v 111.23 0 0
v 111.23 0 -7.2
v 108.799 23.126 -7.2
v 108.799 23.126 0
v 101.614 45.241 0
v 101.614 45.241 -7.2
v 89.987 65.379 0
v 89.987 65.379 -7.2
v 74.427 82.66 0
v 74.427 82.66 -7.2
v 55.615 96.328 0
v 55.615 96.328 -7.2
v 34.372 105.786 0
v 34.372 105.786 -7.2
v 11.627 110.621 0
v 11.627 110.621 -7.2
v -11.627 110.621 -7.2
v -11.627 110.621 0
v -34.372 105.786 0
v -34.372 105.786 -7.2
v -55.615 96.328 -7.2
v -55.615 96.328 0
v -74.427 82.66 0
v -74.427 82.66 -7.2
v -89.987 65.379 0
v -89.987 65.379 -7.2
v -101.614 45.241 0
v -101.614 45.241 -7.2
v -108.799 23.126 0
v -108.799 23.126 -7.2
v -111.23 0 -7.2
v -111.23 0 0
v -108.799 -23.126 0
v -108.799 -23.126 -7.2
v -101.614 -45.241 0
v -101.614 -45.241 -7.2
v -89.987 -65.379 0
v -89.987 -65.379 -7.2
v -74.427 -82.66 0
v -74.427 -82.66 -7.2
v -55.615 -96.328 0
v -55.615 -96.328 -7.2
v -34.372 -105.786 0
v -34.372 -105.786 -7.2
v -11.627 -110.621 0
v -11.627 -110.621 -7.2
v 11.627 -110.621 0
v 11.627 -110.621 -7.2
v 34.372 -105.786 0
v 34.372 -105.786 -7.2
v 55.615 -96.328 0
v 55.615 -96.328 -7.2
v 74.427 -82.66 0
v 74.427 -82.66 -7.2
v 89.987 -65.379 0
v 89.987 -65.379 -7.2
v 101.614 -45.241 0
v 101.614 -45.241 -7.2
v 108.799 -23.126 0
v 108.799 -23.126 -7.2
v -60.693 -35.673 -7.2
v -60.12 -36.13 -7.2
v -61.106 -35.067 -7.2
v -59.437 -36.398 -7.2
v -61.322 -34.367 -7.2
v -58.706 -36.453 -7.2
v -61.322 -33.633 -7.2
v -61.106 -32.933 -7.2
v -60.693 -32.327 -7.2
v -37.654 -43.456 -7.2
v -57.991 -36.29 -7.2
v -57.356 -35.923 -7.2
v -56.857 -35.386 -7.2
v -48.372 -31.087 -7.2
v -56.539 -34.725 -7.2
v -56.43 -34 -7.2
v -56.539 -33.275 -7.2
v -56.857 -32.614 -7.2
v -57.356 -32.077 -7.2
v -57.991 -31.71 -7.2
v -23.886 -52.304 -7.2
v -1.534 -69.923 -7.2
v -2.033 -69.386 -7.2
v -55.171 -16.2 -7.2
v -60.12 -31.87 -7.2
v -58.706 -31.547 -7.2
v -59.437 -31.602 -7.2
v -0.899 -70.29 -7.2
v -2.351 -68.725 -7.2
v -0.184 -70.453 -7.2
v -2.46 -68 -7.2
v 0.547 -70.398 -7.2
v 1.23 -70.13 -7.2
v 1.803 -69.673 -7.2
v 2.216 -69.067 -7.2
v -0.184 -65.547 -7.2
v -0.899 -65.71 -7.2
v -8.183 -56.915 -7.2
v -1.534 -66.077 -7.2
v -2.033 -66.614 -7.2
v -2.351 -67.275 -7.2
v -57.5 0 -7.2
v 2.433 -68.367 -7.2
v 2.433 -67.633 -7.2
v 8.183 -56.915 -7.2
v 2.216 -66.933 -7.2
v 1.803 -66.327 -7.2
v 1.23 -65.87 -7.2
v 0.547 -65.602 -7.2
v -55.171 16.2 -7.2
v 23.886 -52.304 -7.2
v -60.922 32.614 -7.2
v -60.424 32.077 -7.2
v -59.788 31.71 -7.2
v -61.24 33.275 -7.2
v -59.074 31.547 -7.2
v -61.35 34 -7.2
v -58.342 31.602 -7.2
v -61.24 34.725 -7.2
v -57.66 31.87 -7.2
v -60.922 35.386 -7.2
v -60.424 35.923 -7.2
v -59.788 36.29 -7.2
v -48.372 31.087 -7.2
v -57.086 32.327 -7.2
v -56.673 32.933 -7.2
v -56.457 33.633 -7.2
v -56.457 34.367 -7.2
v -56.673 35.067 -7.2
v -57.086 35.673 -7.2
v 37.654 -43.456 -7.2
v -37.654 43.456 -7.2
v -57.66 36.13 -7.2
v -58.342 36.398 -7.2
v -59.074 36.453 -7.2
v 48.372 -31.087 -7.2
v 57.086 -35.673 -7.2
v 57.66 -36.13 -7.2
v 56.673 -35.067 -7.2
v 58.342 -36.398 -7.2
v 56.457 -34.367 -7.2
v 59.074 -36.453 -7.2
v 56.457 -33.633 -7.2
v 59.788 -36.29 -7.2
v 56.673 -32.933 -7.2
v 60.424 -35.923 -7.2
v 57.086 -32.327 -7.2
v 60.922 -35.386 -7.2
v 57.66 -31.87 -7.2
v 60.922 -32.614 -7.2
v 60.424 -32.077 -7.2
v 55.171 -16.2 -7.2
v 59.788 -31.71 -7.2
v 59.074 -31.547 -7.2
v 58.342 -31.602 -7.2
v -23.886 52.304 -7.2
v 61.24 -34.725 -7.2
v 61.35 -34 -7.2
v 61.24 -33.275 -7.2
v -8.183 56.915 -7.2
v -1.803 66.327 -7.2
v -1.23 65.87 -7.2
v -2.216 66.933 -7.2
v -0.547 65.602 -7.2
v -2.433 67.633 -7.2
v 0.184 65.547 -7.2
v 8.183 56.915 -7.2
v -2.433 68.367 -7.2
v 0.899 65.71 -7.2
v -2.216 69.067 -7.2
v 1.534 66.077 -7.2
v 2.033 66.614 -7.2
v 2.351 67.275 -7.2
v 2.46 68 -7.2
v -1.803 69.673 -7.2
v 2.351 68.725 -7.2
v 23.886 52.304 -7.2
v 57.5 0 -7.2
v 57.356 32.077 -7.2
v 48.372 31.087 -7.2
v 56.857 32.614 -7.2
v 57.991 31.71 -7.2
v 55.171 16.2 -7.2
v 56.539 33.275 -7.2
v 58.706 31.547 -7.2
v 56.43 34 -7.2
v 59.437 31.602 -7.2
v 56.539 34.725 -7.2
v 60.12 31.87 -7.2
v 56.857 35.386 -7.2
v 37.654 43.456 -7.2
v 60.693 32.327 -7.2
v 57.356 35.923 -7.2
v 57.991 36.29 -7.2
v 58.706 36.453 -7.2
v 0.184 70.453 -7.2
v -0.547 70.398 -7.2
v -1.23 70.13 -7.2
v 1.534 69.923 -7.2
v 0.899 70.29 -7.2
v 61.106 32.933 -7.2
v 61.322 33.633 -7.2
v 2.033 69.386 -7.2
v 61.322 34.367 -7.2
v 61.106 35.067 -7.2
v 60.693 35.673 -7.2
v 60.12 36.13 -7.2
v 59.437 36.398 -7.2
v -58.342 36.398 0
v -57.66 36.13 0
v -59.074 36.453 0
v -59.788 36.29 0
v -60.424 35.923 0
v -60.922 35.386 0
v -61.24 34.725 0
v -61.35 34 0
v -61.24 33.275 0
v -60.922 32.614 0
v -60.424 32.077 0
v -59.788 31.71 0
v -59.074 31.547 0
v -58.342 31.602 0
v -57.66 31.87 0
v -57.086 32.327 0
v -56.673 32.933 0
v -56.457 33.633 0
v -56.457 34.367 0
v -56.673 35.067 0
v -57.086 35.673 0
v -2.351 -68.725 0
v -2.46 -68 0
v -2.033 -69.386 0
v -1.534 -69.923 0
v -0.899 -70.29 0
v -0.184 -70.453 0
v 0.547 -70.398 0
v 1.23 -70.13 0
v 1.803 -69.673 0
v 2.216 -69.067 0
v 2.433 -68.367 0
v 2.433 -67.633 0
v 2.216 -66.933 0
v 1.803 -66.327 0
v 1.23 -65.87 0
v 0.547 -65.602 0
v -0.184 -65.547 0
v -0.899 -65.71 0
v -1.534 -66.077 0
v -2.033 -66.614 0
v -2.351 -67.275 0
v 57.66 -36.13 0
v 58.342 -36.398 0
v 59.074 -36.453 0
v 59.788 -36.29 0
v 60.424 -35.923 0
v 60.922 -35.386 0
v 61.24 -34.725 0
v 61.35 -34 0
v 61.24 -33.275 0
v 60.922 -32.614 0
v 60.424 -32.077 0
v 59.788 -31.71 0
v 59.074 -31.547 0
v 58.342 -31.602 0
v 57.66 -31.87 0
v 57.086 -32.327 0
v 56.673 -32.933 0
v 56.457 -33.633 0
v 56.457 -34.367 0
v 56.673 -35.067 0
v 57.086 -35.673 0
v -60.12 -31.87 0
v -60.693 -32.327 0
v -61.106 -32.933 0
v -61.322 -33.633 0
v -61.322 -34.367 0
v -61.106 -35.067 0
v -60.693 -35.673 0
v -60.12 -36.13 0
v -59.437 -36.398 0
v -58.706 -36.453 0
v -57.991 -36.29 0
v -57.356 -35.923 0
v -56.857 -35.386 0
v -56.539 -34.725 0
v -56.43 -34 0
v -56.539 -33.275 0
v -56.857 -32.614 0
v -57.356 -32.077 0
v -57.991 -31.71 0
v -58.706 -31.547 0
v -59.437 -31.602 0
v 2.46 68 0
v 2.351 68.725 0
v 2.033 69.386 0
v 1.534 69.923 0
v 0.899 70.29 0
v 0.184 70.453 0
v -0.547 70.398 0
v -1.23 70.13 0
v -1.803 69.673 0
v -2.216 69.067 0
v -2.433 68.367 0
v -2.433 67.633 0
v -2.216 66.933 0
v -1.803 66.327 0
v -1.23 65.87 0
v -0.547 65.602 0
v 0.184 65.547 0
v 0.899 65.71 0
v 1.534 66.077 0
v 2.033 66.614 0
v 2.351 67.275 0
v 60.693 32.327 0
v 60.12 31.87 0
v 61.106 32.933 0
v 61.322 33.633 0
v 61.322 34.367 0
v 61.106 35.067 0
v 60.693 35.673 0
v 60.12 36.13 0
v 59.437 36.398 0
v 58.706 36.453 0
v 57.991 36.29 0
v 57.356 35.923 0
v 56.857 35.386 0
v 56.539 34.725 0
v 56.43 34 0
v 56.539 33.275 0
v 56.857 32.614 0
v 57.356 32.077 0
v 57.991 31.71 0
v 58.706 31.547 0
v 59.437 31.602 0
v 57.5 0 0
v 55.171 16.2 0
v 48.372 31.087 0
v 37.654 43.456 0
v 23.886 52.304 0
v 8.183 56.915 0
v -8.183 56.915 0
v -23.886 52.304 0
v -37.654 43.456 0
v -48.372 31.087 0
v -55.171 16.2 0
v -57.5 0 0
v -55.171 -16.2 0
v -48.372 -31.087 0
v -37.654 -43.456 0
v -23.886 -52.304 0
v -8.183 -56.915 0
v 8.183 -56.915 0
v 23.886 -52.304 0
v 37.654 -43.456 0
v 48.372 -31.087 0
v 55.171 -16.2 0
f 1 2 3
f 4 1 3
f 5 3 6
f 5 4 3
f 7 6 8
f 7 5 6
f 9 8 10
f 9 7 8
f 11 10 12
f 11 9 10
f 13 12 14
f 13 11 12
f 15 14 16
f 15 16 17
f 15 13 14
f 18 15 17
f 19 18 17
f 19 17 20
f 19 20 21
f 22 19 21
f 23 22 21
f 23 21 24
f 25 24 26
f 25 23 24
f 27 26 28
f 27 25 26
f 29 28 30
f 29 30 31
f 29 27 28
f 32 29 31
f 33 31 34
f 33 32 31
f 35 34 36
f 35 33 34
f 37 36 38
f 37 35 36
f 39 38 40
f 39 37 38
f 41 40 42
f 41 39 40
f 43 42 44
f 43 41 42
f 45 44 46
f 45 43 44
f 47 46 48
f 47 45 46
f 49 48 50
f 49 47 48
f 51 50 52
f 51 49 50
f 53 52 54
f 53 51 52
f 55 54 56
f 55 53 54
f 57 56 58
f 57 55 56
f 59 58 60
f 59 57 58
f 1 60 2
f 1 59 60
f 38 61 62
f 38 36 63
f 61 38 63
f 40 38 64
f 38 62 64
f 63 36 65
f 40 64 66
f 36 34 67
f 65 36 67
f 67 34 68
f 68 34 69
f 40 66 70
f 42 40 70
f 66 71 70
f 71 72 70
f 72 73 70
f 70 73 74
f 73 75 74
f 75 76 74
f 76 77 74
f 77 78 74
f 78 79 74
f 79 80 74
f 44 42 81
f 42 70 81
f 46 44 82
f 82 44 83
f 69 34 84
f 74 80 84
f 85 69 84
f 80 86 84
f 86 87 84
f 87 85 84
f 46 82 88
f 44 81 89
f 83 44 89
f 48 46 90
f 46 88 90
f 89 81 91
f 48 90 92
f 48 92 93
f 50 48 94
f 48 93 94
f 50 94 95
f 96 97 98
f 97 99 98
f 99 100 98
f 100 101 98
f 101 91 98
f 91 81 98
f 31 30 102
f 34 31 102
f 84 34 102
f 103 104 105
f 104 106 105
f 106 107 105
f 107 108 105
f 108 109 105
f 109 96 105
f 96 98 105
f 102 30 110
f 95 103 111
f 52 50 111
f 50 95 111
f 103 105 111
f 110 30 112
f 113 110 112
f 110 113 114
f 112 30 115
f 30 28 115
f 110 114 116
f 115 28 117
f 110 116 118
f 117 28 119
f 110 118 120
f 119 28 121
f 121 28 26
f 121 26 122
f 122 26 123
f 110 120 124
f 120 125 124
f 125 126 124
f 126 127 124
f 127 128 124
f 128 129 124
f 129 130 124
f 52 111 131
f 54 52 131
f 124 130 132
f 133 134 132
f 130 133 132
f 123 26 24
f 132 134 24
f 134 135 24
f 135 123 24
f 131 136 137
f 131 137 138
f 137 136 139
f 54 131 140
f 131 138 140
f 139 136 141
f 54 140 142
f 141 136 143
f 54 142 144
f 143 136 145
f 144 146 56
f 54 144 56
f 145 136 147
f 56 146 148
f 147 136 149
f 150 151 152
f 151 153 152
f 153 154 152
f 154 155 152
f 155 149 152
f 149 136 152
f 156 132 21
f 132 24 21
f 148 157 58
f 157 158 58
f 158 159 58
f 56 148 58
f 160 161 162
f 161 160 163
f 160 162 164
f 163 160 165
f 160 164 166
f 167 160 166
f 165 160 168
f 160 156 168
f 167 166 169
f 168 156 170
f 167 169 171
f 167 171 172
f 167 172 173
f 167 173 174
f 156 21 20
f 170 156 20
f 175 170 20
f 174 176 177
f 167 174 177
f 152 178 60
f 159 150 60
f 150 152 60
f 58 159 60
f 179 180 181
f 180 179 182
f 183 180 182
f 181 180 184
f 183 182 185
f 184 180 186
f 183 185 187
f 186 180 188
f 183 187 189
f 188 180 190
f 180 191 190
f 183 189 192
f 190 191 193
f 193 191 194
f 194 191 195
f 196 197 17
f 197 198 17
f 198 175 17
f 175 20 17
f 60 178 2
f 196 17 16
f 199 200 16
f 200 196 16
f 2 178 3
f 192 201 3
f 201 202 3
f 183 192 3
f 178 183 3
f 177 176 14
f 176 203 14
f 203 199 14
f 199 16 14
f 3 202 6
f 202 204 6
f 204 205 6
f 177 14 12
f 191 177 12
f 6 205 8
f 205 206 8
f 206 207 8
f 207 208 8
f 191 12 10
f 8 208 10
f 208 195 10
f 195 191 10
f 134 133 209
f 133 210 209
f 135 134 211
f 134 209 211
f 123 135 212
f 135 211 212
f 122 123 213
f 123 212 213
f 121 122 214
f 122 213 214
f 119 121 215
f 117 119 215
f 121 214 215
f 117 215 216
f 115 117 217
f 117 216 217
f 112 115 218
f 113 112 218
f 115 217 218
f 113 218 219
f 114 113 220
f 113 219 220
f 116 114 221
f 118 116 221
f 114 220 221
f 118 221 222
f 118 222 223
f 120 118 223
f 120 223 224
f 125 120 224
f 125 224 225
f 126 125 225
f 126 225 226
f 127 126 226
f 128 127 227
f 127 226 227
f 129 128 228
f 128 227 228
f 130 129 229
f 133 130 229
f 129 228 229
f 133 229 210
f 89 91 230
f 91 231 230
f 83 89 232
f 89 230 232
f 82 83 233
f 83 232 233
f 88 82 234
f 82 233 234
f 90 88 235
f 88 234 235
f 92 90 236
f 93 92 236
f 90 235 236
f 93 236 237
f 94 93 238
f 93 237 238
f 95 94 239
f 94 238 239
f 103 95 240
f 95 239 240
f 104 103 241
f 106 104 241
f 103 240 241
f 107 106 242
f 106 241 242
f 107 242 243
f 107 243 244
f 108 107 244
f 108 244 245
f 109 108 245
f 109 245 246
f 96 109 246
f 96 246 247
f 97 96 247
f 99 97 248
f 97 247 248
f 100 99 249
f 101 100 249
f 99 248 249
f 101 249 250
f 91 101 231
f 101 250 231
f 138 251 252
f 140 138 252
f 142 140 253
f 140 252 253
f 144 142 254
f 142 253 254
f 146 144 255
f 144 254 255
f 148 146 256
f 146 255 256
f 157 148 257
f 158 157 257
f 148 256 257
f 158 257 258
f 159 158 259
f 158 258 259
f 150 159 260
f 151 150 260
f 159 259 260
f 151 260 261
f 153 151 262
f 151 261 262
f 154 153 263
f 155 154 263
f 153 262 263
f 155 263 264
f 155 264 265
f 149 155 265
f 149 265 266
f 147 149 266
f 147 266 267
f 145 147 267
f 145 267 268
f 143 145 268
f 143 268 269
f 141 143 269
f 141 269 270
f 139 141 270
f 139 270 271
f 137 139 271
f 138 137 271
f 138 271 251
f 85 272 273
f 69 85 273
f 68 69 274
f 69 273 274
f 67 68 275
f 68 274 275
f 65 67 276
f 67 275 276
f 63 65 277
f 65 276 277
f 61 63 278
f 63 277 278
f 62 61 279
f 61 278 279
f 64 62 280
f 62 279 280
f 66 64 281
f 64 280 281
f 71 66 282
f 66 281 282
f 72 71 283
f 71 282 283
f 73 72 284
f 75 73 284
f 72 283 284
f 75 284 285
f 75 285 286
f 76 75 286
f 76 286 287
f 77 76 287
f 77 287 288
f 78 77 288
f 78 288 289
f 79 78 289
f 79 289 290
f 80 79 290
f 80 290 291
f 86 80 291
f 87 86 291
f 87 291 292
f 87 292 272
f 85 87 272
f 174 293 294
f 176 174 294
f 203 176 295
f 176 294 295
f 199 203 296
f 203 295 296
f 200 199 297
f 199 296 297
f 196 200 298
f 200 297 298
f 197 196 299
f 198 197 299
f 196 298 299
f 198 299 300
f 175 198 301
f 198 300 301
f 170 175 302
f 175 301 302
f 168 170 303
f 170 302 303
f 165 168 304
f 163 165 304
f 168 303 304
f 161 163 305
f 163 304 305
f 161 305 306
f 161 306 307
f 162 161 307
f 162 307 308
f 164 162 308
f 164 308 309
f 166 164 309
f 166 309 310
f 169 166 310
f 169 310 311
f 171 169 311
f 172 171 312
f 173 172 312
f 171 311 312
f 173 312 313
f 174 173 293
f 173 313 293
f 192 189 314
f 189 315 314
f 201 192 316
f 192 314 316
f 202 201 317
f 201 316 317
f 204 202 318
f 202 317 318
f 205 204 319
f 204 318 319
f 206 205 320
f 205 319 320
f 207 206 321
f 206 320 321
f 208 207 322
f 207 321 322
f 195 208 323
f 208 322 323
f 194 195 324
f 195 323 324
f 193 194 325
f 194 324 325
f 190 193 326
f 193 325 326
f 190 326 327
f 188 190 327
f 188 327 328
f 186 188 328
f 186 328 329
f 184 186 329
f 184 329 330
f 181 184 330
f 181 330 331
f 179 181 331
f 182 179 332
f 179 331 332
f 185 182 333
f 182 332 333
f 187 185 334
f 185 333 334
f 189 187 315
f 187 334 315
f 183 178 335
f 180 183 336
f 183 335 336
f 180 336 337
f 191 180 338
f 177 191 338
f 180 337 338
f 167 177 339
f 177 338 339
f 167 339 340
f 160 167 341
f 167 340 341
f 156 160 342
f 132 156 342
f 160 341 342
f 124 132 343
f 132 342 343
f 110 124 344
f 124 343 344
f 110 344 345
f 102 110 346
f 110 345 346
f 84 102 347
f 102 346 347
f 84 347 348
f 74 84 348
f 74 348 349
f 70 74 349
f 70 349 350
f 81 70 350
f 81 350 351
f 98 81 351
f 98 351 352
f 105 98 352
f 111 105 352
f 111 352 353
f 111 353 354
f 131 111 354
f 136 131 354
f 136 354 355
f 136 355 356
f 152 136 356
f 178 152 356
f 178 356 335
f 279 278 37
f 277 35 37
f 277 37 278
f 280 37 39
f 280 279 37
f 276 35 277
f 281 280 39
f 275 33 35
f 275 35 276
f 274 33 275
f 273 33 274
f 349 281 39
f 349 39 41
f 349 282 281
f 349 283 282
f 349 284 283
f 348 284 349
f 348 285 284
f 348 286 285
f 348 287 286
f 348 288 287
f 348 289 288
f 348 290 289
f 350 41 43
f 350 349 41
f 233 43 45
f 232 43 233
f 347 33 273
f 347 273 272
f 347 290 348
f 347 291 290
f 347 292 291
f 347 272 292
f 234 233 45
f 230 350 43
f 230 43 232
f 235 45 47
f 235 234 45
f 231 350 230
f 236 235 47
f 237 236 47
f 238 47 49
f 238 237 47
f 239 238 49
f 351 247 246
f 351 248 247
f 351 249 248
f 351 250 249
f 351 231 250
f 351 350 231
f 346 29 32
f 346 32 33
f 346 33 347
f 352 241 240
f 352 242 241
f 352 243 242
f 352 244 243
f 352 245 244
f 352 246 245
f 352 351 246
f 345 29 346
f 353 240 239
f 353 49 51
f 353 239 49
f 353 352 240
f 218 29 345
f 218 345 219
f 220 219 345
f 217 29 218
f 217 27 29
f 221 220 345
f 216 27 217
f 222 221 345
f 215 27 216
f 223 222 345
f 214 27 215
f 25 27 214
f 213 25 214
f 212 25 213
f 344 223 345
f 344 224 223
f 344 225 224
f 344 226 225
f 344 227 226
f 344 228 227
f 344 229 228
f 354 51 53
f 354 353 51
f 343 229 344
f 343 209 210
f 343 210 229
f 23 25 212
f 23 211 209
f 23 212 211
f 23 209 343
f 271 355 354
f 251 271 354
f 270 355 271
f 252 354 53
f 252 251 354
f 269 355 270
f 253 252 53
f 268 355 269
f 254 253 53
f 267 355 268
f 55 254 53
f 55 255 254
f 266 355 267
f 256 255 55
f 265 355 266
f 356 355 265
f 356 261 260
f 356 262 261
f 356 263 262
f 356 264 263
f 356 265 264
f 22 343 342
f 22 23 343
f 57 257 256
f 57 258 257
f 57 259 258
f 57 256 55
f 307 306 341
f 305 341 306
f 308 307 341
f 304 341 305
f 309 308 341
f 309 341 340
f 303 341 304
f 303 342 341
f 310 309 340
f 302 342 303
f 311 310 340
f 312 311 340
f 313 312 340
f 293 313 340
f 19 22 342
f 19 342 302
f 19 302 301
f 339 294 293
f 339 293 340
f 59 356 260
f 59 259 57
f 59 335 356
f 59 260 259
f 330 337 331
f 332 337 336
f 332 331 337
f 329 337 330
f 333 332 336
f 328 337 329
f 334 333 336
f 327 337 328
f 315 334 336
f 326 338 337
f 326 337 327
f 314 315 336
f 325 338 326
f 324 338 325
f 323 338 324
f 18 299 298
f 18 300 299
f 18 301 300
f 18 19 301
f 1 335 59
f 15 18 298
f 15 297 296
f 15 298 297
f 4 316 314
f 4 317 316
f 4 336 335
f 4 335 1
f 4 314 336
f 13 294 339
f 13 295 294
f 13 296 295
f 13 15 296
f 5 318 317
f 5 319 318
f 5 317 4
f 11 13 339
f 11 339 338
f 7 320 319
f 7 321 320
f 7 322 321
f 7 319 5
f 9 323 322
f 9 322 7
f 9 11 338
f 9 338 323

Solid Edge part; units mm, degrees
sketch "Sketch1" plane through (0, 0, 0) normal (0, 0, 1) x (1, 0, 0)
  circle A0 centre (0, 0) radius 111.23
  circle A1 centre (0, 0) radius 57.5
extrude "Protrusion1" add sketch "Sketch1" against normal blind 7.2
sketch "Sketch2" plane through (0, 0, 0) normal (0, 0, 1) x (1, 0, 0)
  circle A0 centre (0, 68) radius 2.46
extrude "Hål_för_skruv" cut sketch "Sketch2" along normal mid plane 644.3251
pattern_circular "Pattern1" count 6 over 360 about axis through (0, 0, 0) along (0, 0, -1) of "Hål_för_skruv"
properties material "Steel"
